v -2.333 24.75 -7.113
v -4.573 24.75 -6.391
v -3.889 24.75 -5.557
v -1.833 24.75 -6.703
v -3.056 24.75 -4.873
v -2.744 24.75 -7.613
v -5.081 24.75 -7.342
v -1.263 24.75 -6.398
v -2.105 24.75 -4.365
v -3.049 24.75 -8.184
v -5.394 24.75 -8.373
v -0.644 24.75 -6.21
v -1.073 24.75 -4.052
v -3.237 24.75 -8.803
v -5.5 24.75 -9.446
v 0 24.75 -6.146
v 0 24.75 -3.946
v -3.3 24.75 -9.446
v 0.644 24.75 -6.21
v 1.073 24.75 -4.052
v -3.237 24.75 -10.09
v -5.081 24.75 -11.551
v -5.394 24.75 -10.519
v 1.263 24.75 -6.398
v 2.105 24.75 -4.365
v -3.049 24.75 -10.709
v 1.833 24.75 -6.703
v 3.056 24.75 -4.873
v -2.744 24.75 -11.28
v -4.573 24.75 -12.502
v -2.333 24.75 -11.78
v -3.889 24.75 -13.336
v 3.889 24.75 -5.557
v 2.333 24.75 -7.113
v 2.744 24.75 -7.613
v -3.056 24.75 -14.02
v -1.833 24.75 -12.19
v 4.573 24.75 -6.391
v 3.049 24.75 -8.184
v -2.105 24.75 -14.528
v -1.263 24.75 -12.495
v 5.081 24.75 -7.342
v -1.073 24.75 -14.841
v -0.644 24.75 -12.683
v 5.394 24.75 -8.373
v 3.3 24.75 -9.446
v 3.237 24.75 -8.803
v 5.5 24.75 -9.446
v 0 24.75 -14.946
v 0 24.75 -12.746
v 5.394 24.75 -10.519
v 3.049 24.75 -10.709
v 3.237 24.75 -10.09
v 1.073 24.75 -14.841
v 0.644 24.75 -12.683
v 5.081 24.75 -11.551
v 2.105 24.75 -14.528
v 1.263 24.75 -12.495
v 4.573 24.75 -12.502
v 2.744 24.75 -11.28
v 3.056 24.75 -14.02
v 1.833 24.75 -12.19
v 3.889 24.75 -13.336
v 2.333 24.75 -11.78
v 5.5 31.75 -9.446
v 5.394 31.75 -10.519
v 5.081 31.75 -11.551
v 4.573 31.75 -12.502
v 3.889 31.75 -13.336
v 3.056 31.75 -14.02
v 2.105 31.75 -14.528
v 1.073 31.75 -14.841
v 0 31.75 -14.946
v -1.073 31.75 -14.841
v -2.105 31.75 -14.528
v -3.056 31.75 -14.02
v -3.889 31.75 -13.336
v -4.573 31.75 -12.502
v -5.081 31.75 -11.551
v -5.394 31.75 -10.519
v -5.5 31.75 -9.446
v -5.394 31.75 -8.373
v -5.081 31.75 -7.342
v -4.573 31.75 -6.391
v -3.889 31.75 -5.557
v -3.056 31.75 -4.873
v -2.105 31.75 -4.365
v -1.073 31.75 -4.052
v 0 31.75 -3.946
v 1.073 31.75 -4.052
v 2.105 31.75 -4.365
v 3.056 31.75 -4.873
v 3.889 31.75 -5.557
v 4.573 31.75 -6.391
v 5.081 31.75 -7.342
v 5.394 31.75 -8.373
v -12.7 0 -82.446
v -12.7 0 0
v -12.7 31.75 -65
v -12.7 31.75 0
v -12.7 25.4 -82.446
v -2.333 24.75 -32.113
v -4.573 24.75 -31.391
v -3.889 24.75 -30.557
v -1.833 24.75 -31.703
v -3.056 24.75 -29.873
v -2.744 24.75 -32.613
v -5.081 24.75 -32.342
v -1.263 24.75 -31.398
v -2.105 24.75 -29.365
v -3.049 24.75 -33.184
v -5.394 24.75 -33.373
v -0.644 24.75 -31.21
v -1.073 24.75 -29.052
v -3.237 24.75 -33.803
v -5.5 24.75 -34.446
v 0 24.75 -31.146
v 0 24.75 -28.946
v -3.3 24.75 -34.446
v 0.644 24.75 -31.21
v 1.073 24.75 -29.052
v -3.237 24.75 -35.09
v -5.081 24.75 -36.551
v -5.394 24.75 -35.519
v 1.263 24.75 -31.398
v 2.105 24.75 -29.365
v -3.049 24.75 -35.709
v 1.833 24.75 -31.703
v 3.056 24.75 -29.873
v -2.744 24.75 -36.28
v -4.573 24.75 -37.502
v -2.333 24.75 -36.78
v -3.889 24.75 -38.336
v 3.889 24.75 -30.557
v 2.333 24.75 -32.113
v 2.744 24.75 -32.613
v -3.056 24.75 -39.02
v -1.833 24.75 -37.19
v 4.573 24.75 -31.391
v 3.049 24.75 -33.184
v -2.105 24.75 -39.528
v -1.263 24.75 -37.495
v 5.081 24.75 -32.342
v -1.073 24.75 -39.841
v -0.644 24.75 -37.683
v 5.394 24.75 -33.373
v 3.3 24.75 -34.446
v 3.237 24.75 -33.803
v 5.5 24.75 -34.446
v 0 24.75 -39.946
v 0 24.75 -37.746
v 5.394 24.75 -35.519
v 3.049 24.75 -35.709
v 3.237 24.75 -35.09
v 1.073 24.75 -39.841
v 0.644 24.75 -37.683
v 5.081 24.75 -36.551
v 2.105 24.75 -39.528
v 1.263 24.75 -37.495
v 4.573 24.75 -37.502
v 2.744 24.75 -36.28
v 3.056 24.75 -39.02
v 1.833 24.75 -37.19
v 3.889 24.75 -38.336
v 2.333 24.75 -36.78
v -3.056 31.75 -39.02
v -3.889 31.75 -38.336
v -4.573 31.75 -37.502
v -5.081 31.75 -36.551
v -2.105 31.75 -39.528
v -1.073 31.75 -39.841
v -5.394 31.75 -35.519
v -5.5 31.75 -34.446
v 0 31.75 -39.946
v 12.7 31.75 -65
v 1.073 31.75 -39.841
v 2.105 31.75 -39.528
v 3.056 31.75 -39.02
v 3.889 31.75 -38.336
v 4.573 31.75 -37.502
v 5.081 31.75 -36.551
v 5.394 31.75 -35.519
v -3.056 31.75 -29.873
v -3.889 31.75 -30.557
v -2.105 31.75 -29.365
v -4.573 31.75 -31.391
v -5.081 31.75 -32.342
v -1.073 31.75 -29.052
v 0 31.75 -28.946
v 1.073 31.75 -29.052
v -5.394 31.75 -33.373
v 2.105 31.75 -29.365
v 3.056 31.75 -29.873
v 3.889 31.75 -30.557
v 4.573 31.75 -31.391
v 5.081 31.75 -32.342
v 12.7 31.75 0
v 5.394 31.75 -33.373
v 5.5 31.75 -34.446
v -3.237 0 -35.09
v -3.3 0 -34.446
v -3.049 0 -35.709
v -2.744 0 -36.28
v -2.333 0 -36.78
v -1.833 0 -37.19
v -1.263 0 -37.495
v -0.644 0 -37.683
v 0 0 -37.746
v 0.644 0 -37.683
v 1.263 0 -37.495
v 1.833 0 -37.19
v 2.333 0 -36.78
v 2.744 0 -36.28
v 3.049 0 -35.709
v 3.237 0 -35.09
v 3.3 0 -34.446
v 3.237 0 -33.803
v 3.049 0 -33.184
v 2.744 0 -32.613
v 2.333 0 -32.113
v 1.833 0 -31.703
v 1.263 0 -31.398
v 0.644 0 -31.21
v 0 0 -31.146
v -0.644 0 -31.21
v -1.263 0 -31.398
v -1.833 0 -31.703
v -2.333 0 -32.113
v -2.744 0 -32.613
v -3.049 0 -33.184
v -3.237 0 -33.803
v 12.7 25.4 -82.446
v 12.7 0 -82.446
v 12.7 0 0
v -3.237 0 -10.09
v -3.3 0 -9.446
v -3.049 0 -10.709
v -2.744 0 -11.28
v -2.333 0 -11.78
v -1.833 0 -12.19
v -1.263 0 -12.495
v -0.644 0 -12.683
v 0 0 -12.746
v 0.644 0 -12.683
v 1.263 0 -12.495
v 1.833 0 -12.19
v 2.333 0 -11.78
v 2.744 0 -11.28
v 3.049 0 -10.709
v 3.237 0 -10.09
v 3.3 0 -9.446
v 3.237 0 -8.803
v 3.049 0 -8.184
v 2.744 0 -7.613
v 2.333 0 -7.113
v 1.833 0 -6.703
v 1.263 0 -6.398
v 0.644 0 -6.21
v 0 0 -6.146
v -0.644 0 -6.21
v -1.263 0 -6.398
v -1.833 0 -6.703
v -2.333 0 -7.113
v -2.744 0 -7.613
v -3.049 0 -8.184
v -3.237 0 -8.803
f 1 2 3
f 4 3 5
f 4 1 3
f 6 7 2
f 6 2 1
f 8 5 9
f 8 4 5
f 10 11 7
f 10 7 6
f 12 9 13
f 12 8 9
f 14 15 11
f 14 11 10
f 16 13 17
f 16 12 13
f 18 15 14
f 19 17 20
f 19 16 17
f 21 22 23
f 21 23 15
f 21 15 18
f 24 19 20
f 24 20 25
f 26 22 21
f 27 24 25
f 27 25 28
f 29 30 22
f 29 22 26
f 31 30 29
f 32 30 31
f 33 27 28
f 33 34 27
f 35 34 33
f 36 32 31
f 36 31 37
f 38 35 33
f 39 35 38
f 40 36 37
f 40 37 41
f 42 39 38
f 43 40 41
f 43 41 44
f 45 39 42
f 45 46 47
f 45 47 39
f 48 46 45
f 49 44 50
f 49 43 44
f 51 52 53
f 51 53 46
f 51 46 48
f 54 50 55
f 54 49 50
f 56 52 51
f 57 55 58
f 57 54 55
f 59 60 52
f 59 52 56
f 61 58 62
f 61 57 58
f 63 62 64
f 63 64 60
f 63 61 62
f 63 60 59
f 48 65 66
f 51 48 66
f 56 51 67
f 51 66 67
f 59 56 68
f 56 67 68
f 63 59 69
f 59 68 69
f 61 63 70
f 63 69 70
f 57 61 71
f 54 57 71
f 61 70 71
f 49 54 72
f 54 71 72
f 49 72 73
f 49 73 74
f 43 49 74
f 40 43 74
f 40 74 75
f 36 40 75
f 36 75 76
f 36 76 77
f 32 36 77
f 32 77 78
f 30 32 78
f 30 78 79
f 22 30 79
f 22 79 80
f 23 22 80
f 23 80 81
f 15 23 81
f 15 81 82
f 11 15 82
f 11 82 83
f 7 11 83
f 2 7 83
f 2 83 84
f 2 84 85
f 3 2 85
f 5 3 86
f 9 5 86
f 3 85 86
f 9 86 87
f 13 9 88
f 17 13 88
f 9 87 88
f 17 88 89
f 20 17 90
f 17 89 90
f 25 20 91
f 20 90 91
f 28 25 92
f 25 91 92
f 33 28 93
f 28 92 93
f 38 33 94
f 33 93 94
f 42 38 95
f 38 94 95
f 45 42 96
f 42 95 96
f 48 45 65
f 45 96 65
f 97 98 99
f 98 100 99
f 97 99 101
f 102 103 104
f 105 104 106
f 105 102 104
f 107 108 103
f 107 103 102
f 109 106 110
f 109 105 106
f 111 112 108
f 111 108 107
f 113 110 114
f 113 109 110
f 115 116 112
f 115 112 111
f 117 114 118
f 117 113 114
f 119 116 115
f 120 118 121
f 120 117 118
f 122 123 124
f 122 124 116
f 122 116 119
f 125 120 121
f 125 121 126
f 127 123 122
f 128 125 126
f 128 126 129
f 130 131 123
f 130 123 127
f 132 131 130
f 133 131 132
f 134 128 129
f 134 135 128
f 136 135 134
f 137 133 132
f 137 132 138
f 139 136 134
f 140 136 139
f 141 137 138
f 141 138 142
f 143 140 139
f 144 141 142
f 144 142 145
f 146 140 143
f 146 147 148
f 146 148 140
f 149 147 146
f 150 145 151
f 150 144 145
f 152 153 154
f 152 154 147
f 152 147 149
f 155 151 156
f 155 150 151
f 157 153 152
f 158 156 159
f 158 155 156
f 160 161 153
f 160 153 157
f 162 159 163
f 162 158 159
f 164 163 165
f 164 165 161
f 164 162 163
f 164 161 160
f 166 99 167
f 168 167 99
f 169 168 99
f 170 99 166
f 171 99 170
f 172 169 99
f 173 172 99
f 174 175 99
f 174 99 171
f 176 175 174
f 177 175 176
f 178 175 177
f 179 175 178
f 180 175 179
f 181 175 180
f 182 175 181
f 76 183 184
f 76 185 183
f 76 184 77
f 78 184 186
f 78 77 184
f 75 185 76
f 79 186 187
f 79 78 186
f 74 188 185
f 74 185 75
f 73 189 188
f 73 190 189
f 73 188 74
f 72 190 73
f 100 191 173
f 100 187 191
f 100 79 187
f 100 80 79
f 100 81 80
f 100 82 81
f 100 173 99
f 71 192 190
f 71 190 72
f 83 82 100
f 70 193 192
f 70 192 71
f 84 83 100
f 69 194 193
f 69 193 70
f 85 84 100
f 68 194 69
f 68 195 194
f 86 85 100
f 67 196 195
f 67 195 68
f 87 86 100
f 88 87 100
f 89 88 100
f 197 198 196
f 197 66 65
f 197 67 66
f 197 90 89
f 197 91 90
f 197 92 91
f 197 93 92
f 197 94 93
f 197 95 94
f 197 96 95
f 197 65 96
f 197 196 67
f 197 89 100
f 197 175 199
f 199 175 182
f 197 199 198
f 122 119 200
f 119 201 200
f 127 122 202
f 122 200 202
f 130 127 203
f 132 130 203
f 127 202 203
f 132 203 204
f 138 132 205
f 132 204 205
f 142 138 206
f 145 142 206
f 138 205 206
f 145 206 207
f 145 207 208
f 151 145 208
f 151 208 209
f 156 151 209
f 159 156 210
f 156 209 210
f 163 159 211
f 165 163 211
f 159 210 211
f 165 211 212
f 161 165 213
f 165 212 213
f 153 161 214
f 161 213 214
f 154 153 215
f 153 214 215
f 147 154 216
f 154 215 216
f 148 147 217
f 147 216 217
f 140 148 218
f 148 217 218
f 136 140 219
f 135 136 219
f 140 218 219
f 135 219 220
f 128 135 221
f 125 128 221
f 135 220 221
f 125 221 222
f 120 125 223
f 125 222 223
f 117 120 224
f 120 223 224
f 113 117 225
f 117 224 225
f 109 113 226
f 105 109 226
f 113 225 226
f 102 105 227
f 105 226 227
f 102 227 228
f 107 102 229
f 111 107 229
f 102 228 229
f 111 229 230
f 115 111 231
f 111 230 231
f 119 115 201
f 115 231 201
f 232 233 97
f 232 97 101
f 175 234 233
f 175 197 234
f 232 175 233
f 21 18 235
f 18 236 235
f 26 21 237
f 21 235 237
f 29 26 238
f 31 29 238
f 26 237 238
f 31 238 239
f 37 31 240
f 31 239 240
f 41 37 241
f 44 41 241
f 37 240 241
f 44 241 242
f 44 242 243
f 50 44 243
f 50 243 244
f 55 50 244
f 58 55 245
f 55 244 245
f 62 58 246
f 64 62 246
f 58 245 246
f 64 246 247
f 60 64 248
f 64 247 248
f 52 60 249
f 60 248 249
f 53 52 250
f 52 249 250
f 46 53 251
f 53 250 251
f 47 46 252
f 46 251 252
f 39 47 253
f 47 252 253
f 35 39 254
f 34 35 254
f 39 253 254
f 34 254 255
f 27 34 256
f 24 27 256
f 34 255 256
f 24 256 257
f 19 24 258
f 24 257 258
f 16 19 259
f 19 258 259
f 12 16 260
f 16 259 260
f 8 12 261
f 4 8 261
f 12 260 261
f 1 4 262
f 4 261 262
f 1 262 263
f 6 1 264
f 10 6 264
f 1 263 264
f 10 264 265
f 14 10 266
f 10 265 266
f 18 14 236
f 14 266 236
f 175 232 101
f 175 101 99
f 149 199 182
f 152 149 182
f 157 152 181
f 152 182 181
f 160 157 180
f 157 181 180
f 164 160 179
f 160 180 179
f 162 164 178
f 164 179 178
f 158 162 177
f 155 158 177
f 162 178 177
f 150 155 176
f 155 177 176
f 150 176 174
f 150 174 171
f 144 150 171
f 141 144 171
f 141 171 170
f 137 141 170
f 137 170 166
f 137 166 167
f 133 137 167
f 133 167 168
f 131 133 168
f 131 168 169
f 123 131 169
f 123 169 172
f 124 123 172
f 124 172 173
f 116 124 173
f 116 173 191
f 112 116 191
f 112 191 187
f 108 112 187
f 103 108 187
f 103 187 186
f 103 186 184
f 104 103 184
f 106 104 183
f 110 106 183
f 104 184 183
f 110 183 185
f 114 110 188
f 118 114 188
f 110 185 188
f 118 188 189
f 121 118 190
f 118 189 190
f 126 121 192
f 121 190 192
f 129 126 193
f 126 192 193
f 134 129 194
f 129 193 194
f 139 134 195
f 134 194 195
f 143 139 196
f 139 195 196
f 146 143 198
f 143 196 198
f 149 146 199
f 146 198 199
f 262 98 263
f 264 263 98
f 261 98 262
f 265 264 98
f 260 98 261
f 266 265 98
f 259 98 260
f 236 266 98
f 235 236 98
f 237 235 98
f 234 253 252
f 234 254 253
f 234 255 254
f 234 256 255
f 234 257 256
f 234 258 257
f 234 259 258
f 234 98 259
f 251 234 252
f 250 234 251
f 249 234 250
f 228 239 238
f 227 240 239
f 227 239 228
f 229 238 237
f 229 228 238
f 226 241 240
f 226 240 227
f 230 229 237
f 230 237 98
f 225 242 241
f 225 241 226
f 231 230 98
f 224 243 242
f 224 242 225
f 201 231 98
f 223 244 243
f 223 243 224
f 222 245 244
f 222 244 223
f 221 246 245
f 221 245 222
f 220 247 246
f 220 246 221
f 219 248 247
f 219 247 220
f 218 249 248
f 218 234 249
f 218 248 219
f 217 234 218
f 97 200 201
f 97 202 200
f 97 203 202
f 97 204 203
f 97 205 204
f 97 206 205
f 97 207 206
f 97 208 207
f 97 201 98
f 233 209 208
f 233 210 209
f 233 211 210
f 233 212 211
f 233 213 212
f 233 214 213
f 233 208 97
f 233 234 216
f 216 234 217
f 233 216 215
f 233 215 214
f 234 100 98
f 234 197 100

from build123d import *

# Parameters (mm, degrees)
BOSS_EXTRUDE1_DEPTH                                 = 12.7
CBORE_FOR_M6_HEX_SOCKET_HEAD_CAP_SCREW1_D           = 6.6
CBORE_FOR_M6_HEX_SOCKET_HEAD_CAP_SCREW1_CBORE_D     = 11
CBORE_FOR_M6_HEX_SOCKET_HEAD_CAP_SCREW1_CBORE_DEPTH = 7


with BuildPart() as part:
    # Sketch1 → Boss-Extrude1 (new, symmetric)
    with BuildSketch(Plane(origin=(0, 0, 0), x_dir=(0, 0, -1), z_dir=(1, 0, 0))):
        Polygon((0, 0), (82.446481614, 0), (82.446481614, 25.4), (65, 31.75), (0, 31.75), align=None)
    extrude(amount=BOSS_EXTRUDE1_DEPTH, both=True)

    # CBORE for M6 Hex Socket Head Cap Screw1 (through all)
    with Locations(Plane(origin=(0, 31.75, 0), x_dir=(1, 0, 0), z_dir=(0, 1, 0))):
        with Locations((0, 9.446481614), (0, 34.446481614)):
            CounterBoreHole(CBORE_FOR_M6_HEX_SOCKET_HEAD_CAP_SCREW1_D / 2, CBORE_FOR_M6_HEX_SOCKET_HEAD_CAP_SCREW1_CBORE_D / 2, CBORE_FOR_M6_HEX_SOCKET_HEAD_CAP_SCREW1_CBORE_DEPTH)


solid = part.part
